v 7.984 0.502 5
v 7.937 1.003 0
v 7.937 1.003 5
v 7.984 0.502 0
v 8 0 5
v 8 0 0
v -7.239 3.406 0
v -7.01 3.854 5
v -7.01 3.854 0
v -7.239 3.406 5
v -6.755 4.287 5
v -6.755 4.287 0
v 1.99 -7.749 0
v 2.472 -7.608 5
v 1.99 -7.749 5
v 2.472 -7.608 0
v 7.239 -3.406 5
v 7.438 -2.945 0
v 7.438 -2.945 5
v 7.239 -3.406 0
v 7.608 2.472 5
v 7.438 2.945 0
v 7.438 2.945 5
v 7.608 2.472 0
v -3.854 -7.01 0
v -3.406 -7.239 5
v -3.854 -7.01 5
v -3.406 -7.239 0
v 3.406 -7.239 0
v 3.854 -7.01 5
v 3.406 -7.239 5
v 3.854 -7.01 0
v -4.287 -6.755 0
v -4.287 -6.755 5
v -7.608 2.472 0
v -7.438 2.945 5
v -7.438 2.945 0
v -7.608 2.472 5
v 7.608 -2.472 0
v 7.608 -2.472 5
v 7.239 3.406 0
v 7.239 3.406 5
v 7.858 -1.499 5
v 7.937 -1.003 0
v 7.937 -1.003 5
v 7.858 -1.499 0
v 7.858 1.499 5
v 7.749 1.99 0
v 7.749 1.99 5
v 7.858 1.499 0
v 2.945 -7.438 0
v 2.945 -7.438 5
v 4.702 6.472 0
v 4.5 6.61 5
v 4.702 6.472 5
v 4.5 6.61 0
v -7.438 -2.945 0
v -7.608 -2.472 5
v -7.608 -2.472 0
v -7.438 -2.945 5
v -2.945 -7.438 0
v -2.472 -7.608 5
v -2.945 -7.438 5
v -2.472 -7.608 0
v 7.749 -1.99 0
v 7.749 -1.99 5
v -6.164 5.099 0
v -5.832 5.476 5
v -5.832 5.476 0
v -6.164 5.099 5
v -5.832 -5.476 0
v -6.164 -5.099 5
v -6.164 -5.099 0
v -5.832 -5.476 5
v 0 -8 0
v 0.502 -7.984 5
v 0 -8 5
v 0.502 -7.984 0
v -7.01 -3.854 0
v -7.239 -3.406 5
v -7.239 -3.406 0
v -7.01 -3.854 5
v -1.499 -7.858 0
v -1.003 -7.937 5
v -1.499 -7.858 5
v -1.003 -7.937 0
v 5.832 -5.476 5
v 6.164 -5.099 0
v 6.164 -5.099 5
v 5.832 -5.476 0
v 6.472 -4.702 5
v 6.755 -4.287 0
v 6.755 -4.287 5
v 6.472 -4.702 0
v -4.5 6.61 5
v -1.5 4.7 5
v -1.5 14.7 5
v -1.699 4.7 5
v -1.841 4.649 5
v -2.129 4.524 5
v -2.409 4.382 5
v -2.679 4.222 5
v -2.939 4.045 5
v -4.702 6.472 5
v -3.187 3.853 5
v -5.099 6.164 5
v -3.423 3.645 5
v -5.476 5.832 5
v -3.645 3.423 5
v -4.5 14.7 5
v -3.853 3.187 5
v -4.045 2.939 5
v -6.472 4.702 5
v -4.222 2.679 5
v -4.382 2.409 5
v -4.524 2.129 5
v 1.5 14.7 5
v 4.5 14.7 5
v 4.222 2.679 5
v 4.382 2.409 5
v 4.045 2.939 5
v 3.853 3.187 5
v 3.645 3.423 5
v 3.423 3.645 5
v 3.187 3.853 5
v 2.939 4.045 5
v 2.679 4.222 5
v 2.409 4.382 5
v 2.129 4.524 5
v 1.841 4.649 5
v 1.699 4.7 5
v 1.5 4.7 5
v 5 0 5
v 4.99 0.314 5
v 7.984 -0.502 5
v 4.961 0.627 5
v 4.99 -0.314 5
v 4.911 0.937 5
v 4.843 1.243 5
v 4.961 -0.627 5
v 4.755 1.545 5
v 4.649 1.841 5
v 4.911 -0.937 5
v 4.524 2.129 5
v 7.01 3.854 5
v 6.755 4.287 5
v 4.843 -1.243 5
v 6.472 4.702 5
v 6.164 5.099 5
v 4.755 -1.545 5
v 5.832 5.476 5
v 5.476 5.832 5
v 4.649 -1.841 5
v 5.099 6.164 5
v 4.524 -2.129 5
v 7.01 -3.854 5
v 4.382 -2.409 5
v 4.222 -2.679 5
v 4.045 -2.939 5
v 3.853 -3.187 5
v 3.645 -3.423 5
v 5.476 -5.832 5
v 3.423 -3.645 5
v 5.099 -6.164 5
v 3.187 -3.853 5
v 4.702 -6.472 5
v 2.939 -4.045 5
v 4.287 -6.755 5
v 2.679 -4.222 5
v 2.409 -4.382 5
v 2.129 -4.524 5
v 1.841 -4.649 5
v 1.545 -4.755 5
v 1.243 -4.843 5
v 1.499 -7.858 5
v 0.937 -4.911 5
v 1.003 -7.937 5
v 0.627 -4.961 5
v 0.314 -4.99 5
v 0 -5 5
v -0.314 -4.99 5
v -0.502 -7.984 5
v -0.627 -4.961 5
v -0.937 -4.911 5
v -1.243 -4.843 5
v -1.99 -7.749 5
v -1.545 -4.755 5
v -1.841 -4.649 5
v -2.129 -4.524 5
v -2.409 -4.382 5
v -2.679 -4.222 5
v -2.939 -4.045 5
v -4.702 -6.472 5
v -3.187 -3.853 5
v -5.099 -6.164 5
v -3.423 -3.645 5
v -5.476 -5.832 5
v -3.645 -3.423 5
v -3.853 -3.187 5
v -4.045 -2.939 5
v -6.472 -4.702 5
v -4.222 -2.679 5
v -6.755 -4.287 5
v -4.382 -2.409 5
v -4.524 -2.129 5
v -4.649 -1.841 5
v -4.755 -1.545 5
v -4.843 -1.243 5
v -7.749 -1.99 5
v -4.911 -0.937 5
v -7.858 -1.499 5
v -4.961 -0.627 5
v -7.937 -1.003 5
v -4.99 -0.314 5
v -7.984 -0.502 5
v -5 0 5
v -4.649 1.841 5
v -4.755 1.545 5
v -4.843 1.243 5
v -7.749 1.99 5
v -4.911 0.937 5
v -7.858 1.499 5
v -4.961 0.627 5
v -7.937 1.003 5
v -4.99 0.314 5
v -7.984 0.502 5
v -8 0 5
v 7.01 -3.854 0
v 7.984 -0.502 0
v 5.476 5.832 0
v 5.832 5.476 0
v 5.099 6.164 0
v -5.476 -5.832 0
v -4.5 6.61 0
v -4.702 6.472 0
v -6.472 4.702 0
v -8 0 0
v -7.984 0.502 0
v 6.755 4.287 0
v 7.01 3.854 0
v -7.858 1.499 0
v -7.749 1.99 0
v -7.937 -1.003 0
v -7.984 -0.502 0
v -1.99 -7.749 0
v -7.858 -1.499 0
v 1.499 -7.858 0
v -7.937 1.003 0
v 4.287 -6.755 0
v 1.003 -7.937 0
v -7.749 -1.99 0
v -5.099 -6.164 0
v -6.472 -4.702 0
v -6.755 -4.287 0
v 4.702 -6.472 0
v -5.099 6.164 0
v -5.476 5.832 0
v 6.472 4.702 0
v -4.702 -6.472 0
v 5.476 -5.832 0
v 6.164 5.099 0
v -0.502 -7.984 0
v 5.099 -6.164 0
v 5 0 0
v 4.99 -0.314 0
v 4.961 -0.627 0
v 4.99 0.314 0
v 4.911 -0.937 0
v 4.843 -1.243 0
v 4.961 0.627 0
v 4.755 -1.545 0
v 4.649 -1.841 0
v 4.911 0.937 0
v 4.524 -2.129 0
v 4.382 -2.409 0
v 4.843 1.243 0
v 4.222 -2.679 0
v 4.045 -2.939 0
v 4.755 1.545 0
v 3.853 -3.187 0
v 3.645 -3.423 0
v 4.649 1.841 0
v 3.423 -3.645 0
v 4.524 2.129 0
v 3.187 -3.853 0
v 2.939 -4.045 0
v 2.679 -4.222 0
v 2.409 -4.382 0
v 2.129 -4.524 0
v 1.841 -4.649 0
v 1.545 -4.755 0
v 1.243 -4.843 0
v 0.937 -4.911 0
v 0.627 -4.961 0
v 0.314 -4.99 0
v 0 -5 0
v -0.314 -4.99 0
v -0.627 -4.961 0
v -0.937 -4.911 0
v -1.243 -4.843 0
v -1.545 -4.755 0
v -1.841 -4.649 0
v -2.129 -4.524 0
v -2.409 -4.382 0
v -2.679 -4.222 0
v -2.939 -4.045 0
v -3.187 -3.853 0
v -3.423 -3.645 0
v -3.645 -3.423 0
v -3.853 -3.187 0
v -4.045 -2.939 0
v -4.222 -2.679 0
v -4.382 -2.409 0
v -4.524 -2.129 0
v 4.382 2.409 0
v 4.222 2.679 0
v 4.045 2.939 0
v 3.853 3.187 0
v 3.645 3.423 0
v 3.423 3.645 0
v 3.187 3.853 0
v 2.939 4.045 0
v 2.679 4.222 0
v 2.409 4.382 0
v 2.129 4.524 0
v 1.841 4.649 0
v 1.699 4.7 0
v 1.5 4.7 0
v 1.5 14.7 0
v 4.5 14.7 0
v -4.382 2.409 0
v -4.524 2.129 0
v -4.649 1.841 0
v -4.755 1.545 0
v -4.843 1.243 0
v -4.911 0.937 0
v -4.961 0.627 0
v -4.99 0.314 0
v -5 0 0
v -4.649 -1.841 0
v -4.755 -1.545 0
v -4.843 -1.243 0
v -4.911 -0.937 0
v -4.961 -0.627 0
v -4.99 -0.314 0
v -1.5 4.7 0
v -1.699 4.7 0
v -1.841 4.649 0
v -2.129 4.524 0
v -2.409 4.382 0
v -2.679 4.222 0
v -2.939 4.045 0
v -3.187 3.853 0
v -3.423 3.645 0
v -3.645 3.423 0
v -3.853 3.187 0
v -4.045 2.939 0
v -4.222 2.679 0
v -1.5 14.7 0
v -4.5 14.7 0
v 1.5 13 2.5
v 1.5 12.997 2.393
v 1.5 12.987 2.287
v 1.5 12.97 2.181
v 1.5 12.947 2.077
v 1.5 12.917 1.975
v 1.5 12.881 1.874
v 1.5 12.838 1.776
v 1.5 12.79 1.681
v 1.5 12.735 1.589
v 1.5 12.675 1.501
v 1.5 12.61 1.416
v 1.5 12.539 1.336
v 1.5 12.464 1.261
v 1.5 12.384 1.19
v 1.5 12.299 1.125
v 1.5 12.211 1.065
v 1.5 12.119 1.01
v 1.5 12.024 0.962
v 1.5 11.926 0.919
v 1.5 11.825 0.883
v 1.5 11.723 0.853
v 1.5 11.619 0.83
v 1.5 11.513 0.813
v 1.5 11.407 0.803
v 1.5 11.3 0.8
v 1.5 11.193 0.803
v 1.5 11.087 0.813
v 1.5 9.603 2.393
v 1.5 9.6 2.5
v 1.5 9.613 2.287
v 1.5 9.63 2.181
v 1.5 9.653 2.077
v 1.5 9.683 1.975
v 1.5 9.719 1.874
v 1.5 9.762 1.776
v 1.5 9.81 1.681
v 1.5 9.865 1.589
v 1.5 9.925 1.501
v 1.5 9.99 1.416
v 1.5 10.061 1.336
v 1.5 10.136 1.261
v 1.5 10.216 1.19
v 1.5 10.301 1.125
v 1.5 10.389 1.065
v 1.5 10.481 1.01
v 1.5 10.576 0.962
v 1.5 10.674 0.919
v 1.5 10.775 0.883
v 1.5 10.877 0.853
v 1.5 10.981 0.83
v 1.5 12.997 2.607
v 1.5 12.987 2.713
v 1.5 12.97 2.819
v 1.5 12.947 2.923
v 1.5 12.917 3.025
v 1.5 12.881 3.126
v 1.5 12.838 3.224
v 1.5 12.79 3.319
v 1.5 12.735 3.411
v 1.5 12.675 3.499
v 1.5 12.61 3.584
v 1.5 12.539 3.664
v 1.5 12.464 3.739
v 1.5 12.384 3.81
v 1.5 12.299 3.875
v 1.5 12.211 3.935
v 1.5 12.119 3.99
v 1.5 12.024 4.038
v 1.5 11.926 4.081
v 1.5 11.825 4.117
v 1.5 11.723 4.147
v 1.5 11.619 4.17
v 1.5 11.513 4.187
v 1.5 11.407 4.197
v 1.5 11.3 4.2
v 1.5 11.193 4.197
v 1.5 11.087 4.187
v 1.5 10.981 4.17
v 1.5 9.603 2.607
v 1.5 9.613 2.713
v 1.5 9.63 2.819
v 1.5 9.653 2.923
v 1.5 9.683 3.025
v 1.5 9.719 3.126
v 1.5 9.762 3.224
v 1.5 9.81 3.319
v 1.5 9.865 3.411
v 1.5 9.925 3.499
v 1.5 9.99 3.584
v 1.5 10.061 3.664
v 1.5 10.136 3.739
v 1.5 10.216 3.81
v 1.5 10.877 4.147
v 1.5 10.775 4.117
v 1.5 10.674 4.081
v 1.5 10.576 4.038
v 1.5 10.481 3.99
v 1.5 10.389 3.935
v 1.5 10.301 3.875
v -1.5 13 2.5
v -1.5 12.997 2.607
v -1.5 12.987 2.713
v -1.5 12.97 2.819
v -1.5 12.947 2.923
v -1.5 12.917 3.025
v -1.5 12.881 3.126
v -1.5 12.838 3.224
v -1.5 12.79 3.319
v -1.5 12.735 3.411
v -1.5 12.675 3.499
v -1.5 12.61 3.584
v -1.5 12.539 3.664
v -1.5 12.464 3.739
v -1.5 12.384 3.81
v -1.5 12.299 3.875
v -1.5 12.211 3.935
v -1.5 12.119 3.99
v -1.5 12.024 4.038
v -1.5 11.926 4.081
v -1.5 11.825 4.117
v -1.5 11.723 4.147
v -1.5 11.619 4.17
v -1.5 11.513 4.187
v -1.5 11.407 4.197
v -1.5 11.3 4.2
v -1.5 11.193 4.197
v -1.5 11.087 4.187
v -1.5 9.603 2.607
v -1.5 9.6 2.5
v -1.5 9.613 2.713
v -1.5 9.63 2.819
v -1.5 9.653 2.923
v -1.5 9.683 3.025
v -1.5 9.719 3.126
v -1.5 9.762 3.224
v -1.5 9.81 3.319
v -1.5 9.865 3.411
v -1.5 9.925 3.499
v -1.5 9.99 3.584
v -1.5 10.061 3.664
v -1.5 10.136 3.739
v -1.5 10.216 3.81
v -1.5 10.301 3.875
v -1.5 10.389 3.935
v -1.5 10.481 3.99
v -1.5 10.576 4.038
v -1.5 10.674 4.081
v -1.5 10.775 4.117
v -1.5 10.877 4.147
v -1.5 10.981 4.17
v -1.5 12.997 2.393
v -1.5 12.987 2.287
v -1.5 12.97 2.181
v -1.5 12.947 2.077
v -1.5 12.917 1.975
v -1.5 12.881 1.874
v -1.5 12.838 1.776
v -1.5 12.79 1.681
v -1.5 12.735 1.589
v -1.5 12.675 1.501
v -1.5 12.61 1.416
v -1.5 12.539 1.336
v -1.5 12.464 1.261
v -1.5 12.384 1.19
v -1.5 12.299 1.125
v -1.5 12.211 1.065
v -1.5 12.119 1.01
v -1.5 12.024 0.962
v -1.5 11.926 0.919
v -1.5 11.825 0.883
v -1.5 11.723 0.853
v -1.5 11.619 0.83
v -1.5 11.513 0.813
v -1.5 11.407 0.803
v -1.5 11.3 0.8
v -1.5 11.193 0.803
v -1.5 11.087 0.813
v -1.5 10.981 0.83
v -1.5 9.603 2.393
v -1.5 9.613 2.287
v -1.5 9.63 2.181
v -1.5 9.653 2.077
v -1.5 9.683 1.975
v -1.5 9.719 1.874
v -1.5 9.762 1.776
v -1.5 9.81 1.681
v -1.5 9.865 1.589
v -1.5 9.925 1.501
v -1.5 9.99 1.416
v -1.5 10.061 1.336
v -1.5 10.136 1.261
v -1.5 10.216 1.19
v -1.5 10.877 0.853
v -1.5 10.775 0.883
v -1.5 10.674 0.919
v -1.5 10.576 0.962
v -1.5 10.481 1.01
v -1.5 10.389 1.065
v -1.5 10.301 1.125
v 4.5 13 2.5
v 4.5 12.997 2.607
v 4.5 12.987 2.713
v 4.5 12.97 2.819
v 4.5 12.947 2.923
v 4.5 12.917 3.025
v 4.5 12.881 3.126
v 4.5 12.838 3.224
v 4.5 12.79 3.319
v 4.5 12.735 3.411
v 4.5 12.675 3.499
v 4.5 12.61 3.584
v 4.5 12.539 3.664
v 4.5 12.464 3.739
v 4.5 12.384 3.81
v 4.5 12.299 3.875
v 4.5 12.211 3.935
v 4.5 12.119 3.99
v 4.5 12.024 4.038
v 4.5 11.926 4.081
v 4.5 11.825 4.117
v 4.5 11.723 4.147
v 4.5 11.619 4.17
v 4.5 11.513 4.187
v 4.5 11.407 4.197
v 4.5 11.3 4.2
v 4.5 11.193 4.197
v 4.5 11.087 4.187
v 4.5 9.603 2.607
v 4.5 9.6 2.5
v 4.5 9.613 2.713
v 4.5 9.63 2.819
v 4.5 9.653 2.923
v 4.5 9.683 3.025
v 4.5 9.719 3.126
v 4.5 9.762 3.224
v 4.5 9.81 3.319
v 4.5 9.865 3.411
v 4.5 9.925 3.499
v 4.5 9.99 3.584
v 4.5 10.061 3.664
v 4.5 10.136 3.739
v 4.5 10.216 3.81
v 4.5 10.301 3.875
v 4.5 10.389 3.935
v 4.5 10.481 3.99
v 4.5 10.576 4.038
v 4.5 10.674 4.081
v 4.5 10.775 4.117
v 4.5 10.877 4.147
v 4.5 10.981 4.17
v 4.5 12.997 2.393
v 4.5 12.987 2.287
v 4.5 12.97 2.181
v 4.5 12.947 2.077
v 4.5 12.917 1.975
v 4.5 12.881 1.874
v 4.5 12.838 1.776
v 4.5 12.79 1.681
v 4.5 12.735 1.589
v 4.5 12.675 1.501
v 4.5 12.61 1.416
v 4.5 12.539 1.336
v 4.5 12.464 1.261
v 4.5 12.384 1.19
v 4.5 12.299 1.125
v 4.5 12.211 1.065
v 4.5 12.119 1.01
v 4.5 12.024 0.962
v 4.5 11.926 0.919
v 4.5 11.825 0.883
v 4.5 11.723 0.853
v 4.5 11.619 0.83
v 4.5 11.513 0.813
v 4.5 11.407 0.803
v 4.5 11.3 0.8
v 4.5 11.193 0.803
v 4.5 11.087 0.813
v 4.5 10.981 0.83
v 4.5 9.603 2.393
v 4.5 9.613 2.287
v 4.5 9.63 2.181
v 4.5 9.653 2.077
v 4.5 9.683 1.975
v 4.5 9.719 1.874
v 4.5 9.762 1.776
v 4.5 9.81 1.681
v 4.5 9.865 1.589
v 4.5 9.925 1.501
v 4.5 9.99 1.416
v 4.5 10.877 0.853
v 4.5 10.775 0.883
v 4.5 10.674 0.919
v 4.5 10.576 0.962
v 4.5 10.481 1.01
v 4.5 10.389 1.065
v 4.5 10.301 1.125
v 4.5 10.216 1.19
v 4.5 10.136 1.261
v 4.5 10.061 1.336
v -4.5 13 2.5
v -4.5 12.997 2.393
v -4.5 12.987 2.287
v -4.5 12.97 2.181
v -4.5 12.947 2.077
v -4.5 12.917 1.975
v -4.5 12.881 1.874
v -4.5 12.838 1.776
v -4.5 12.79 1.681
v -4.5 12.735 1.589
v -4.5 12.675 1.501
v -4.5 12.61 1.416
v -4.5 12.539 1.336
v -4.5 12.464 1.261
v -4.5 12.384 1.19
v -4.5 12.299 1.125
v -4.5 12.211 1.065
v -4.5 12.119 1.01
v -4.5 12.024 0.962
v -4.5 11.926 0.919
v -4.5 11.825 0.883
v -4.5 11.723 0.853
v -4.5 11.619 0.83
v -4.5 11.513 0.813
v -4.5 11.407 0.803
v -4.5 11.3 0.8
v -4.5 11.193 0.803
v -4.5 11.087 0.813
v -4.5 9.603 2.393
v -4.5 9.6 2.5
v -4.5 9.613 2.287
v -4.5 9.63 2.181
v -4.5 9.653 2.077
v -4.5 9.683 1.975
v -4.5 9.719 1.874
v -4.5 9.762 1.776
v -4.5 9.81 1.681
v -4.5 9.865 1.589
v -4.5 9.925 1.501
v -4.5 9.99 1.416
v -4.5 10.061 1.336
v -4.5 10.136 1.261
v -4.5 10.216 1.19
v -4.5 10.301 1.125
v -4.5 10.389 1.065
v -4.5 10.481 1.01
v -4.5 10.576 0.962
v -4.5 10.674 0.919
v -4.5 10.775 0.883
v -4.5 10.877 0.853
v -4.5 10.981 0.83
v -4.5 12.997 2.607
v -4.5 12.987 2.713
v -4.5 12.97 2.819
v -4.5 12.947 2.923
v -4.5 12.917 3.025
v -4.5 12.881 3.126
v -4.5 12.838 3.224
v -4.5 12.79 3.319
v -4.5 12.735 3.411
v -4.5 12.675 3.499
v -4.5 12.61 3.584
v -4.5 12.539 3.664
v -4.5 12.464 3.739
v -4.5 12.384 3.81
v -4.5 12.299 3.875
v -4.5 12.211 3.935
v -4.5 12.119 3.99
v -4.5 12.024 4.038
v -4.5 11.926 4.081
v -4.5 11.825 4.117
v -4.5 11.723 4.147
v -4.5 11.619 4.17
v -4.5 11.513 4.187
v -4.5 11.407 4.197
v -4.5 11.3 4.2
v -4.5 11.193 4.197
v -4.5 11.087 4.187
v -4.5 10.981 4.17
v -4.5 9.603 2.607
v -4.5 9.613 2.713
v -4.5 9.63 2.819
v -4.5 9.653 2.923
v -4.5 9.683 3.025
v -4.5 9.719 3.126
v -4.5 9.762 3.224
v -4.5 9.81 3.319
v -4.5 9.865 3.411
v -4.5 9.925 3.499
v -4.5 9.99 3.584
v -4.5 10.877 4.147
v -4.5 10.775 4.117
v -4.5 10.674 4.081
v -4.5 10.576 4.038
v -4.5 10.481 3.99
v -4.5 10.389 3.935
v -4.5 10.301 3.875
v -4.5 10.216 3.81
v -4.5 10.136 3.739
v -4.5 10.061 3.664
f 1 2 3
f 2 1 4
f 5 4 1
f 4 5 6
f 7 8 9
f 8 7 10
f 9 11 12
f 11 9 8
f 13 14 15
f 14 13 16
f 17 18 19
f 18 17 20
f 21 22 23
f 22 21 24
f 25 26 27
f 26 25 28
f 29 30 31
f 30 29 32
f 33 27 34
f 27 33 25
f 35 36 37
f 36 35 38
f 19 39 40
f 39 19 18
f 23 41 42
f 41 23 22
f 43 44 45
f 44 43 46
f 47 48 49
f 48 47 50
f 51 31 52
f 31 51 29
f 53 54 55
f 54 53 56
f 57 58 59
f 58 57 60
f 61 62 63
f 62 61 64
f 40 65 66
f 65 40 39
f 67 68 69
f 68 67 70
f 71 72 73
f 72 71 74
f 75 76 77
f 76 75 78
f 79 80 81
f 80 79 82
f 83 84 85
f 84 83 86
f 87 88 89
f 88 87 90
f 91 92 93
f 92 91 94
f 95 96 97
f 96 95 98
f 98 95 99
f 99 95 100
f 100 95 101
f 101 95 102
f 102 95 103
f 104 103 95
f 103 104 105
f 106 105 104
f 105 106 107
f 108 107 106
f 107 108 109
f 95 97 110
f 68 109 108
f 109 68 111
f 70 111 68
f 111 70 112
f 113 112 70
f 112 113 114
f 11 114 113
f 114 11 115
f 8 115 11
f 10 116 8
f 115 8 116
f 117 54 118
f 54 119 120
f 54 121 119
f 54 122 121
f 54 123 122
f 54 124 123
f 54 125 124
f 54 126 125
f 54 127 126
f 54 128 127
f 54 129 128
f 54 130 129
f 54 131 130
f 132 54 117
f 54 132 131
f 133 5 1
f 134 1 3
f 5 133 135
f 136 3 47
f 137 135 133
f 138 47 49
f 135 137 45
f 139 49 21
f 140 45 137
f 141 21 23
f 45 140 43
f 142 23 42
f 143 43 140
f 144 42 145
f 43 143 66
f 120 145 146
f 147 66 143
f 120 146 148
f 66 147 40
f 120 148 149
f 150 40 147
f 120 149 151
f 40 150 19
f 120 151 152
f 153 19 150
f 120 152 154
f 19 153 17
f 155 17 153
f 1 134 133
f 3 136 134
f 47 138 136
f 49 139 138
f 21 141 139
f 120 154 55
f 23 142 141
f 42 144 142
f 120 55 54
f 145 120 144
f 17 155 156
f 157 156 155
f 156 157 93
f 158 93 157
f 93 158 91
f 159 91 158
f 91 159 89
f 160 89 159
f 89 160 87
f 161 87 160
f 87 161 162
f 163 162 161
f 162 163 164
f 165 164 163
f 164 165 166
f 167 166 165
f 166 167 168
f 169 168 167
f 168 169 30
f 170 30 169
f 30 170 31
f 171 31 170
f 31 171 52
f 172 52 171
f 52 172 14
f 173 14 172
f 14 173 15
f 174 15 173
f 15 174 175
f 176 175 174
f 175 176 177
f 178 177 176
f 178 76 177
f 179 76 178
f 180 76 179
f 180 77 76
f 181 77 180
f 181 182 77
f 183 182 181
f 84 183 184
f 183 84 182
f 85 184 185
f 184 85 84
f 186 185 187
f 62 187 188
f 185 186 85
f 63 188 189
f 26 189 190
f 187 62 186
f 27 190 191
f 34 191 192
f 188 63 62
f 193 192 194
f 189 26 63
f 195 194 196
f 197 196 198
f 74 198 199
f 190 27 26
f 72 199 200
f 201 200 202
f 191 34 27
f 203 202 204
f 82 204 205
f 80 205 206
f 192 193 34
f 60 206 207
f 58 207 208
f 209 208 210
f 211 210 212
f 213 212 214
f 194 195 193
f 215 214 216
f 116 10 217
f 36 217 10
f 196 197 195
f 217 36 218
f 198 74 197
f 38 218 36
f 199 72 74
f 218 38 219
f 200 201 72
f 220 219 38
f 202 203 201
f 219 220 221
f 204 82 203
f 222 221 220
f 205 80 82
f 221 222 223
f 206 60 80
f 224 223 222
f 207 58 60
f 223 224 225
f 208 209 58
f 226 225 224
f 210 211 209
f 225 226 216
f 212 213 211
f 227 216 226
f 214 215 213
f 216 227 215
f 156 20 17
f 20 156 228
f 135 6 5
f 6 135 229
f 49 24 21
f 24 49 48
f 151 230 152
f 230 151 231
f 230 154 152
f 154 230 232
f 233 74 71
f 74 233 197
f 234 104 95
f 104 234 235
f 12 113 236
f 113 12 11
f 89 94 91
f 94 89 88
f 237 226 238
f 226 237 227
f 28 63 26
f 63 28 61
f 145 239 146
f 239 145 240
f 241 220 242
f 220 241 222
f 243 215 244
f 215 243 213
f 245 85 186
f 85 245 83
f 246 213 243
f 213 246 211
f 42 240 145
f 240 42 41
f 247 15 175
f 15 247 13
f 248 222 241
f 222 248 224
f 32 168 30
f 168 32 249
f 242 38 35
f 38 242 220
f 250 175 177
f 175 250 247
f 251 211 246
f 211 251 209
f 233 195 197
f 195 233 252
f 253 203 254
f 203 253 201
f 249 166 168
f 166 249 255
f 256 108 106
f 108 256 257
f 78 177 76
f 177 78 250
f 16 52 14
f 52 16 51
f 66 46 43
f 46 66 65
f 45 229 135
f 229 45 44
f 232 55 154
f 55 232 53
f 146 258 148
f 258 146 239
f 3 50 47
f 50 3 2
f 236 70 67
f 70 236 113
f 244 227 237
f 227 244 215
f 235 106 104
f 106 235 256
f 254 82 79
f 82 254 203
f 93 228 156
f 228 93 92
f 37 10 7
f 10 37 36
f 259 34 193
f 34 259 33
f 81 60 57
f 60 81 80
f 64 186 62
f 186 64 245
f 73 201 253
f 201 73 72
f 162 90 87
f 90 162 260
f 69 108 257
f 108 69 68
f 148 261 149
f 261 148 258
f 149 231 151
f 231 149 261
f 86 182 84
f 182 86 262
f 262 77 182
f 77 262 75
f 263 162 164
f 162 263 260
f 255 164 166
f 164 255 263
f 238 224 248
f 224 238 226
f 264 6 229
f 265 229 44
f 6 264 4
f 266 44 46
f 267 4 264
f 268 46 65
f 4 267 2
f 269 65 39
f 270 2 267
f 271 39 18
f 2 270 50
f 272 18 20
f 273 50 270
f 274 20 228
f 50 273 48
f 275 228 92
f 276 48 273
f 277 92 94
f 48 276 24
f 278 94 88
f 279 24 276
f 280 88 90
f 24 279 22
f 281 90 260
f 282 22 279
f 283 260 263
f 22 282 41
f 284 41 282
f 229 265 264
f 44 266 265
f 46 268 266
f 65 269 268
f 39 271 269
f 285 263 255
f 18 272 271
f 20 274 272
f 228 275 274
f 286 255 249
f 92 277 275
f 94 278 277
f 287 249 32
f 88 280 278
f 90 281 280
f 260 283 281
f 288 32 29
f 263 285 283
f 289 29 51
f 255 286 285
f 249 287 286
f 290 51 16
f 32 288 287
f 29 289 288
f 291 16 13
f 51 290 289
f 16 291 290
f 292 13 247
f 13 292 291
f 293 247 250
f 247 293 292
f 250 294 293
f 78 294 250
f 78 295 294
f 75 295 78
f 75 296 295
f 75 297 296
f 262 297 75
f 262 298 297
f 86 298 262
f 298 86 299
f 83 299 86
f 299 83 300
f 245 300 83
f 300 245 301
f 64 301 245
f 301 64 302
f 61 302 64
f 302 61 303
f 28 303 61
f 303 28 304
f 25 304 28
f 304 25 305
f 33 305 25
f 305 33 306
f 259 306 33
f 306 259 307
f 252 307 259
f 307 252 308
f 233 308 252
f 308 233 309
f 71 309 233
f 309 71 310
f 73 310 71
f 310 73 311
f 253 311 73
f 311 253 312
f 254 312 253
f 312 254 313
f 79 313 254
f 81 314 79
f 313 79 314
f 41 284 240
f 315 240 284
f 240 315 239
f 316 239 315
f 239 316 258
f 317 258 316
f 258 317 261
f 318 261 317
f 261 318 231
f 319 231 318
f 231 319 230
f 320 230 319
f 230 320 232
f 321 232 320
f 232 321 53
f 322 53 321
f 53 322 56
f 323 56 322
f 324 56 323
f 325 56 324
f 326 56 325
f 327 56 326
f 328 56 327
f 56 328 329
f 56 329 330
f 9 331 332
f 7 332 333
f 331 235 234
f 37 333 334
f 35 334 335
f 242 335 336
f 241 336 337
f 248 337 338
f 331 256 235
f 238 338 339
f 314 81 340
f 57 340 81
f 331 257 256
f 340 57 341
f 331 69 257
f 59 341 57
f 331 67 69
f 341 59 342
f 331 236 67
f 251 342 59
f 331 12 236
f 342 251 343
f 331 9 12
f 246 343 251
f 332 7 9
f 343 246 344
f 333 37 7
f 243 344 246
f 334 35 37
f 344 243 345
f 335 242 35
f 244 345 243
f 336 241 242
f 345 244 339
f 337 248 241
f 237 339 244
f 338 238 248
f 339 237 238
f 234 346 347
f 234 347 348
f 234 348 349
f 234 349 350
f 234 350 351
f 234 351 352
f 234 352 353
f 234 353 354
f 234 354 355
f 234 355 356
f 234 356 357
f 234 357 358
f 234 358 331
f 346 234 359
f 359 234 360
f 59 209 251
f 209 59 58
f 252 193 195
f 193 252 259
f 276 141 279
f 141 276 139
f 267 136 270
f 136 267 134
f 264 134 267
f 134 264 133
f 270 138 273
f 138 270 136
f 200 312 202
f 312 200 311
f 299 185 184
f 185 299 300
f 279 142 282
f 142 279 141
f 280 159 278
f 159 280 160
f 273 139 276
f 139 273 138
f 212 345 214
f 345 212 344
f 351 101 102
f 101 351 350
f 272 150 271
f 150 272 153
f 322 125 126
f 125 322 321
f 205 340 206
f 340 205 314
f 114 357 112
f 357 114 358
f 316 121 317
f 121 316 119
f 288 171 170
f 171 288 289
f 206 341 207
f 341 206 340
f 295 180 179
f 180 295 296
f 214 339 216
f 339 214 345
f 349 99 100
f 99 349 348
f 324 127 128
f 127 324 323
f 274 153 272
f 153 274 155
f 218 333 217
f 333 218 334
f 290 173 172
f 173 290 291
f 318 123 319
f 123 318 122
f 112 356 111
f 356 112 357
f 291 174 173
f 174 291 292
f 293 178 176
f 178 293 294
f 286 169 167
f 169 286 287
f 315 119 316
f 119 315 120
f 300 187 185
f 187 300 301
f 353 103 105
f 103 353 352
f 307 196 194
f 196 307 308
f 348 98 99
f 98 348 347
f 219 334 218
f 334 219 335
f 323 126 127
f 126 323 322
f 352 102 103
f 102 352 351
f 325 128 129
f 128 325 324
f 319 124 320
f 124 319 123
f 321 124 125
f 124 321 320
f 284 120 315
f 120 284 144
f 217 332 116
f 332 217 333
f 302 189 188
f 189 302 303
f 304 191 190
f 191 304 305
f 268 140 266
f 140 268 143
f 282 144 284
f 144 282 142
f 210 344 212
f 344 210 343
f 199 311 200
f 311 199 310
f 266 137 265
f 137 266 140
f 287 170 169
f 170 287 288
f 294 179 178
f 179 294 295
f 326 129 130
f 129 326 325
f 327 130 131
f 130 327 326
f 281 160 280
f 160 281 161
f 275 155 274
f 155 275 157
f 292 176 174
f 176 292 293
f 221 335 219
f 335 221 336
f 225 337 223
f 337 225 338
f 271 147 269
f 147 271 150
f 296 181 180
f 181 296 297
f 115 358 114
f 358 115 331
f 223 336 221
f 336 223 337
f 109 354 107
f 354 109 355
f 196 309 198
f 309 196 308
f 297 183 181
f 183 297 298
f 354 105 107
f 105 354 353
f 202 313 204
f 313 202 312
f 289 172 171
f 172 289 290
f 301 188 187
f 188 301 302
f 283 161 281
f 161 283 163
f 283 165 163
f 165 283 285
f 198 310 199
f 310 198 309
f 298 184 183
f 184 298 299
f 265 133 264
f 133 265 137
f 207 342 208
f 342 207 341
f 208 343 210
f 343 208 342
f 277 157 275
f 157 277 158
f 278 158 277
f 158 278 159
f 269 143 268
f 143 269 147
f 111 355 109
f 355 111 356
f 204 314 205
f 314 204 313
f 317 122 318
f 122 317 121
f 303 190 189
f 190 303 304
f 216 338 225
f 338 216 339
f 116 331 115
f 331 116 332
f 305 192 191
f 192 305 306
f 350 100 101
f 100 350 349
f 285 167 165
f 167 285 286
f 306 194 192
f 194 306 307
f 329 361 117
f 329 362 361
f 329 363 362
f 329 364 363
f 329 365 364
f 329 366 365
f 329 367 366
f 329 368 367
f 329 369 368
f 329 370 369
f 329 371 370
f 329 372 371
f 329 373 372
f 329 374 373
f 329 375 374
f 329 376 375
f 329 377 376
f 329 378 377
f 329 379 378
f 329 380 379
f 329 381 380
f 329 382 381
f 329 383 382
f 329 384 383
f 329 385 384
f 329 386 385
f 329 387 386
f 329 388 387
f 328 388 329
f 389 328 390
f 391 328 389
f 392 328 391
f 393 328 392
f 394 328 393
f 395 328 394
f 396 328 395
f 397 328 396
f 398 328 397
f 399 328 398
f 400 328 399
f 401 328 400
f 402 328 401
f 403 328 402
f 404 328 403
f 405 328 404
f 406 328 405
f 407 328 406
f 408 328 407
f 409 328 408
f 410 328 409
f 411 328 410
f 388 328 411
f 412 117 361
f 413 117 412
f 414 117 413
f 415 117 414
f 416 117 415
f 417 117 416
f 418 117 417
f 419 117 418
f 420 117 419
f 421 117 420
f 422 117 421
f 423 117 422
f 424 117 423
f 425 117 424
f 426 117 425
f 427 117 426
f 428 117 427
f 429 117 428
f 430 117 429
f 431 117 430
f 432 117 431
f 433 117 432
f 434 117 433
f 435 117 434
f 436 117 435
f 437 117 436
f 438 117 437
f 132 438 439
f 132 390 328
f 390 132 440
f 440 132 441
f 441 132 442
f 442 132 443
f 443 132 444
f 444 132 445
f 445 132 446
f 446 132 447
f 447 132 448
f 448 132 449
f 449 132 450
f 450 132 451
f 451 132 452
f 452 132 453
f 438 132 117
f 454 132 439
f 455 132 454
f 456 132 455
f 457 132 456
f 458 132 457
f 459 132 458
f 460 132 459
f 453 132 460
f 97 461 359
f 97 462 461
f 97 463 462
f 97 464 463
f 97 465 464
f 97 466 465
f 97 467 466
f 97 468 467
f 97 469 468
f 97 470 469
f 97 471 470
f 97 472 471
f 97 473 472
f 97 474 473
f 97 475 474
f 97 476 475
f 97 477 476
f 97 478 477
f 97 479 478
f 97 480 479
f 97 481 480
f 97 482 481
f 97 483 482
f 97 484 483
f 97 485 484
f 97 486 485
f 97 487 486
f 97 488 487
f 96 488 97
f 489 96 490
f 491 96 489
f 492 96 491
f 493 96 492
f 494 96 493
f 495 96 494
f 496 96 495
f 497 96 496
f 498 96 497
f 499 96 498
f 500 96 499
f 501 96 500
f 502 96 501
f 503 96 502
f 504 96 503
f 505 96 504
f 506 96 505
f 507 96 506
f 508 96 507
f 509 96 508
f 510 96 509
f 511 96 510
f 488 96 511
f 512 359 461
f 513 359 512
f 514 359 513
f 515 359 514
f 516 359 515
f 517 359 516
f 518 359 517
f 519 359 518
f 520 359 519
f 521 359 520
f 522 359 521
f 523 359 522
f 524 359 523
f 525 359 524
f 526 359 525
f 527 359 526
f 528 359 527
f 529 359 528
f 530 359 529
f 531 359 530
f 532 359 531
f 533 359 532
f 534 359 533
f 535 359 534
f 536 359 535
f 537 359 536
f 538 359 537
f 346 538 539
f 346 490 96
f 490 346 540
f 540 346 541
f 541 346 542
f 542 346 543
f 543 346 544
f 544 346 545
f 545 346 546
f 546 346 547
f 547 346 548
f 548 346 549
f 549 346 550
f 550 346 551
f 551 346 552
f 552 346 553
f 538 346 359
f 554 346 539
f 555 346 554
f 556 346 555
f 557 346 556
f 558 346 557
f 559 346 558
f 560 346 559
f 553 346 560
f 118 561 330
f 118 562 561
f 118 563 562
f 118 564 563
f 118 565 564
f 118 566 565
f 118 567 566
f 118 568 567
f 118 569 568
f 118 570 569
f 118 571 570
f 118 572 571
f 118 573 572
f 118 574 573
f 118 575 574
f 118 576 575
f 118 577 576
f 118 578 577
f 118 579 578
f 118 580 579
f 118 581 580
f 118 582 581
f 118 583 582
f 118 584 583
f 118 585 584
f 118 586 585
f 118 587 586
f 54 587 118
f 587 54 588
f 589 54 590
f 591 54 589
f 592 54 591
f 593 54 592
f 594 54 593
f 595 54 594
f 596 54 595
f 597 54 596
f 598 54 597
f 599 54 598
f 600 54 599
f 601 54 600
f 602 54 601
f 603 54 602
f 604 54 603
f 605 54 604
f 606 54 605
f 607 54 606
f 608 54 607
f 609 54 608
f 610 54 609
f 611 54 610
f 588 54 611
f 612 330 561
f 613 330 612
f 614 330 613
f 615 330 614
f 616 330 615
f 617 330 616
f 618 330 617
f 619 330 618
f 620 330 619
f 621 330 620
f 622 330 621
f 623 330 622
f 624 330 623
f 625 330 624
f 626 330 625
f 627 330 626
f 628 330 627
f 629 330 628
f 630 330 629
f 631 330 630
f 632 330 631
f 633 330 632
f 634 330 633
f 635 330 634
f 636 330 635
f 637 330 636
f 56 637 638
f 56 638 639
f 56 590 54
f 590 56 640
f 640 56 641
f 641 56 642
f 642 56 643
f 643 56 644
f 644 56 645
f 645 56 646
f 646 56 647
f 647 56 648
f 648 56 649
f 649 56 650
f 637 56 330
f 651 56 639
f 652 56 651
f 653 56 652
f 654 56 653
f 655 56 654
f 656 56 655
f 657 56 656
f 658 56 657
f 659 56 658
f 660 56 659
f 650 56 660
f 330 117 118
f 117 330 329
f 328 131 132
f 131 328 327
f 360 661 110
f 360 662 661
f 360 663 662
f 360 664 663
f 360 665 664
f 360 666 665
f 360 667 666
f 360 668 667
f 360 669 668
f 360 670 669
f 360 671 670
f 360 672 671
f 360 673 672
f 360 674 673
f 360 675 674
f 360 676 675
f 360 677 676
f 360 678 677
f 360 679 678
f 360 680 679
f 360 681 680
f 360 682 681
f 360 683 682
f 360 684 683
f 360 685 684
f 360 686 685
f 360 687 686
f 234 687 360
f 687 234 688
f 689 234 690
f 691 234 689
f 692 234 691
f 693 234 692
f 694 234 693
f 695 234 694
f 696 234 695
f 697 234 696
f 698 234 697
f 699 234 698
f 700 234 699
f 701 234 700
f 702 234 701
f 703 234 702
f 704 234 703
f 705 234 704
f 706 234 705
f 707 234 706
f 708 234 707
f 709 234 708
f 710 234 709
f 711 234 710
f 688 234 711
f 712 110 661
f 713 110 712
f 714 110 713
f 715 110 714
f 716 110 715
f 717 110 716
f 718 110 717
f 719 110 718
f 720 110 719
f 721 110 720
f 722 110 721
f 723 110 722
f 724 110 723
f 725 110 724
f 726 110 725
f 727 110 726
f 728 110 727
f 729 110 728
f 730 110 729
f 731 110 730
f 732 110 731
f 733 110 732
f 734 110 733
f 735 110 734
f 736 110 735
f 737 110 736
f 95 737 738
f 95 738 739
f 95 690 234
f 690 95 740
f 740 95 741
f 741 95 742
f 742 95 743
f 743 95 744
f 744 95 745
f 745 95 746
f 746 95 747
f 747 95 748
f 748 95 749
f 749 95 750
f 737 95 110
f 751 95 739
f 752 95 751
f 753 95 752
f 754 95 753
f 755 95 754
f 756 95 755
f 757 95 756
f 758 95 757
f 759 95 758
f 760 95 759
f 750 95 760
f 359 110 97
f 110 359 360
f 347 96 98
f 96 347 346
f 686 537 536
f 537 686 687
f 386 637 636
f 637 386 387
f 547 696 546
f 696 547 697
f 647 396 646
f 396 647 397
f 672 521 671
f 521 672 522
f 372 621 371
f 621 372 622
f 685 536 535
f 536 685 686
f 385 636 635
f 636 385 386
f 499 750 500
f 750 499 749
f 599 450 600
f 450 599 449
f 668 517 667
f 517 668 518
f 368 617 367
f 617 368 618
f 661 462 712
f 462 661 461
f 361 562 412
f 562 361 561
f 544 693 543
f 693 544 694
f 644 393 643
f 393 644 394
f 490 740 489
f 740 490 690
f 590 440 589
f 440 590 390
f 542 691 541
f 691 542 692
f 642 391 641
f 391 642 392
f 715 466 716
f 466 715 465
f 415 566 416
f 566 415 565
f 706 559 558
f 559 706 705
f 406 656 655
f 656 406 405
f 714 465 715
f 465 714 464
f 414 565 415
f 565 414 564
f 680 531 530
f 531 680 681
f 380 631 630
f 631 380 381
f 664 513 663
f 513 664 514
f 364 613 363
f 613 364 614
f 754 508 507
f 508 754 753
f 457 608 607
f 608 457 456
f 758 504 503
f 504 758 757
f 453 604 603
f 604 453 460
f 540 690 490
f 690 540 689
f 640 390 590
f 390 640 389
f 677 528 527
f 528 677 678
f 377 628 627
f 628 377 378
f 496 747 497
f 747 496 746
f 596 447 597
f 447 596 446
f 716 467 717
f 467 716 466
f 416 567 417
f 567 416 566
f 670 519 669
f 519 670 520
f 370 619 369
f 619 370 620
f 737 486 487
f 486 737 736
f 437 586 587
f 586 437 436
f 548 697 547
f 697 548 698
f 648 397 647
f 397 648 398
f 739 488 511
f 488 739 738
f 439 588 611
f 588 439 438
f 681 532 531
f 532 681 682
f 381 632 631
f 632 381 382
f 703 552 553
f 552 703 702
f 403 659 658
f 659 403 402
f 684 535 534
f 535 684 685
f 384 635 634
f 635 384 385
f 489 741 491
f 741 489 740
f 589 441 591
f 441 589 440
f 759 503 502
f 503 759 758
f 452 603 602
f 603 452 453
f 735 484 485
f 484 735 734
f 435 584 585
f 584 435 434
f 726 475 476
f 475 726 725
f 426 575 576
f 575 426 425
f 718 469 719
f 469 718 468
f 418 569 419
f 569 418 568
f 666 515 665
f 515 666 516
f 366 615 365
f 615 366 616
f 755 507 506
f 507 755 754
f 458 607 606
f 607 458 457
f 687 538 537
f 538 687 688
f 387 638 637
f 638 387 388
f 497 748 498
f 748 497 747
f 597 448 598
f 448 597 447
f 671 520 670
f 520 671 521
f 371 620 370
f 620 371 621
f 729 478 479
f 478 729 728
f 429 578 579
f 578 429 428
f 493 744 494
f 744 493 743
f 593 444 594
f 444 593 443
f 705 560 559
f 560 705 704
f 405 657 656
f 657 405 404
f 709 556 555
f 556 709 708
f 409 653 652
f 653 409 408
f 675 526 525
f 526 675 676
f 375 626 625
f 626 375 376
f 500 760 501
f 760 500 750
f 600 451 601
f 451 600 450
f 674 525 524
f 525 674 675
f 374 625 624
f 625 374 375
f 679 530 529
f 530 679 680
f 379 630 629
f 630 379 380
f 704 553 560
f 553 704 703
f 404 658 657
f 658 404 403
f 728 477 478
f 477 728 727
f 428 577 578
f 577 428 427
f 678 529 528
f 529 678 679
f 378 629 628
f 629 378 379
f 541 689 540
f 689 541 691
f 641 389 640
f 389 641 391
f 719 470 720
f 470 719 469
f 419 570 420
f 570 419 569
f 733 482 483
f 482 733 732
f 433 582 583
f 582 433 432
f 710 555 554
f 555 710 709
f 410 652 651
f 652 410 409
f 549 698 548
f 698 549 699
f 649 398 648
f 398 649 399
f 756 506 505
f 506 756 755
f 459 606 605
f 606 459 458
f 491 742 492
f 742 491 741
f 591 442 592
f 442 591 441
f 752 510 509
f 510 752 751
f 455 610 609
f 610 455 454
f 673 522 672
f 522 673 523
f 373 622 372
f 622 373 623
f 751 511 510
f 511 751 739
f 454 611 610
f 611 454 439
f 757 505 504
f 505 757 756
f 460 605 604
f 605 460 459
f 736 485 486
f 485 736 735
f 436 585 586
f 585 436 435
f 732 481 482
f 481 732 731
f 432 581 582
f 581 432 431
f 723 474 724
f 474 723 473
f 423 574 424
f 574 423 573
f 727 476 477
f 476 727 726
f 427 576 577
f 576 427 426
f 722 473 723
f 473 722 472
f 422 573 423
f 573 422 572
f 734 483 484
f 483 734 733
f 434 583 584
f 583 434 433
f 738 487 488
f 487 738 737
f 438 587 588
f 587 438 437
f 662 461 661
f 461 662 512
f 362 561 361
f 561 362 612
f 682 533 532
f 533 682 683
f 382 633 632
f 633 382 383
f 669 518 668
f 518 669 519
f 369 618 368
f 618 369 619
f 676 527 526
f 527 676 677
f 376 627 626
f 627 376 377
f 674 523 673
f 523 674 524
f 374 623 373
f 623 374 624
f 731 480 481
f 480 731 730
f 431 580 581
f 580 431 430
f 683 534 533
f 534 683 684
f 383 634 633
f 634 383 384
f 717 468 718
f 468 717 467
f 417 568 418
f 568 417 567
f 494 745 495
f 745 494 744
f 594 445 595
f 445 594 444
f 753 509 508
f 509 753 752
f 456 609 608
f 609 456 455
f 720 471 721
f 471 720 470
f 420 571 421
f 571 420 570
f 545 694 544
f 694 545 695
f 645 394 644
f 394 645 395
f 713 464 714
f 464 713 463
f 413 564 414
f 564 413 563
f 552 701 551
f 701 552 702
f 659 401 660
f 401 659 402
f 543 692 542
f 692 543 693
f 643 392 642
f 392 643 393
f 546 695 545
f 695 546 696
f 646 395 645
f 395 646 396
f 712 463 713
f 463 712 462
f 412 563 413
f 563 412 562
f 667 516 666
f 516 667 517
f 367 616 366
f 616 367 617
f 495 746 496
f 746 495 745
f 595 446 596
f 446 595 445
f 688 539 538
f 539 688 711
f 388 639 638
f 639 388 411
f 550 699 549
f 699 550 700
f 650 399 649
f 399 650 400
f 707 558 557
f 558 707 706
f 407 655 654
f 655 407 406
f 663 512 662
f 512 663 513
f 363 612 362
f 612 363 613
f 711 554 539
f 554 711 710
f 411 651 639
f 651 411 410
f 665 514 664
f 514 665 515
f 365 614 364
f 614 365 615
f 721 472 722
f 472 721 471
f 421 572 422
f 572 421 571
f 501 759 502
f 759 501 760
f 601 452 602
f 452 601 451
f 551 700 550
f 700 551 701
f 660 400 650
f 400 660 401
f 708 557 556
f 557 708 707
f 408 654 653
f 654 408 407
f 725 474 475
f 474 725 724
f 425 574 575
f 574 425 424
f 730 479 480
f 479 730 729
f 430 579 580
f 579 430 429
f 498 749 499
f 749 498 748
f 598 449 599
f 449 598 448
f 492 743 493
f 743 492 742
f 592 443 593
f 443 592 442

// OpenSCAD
// CSG.scad - Basic example of CSG usage
$fn=100; 
    wallThickness = 3;  //Thickness of walls
    halfWall = wallThickness / 2;
    depth = 20;         //depth of bracket


clamp(5,5,3,3,10,1.7);

//stand();
module stand(width=50,depth=20,height=20,wallThickness=3)
{
    halfWall = wallThickness / 2;
    
    cube([width,depth,wallThickness]);
    
    translate([width/2 - halfWall,0,0]){
        cube([wallThickness,depth,height]);
    }
    translate([width/2,depth,height + 5.3 + wallThickness -2])
    {
        rotate([90,0,0]){
            clamp(5.3);
        }
    }
}


module clamp(holeRadius, depth=20, gap=3, wallThickness = 3,tabSize=10,screwRadius=1.7)
{
    halfWall = wallThickness / 2;
    difference()
    {   
        cylinder(depth,holeRadius + wallThickness,holeRadius + wallThickness);
        cylinder(depth*2 + 5,holeRadius,holeRadius,center=true);
        translate([-gap/2, holeRadius - halfWall,-5]){
            cube([gap,wallThickness+2,depth + 20]);
        }
    }
    
    difference()
    {
        union()
        {
            translate([gap/2,holeRadius-0.3,0]){
                cube([wallThickness,tabSize,depth]);
            }
            
            translate([-gap/2 -wallThickness,holeRadius-0.3,0]){
                cube([wallThickness,tabSize,depth]);
            }
        }
        
        translate([0,holeRadius+wallThickness + tabSize/2 - screwRadius,depth/2])
            {
                rotate([0,90,0]){
                    cylinder(holeRadius*2,screwRadius,screwRadius, center=true);
                }
            }
    }
}


/*
translate([-24,0,0]) {
    union() {
        cube(15, center=true);
        sphere(10);
    }
}

intersection() {
    cube(15, center=true);
    sphere(10);
}

translate([24,0,0]) {
    difference() {
        cube(15, center=true);
        sphere(10);
    }
}
*/

echo(version=version());
// Written by Marius Kintel <marius@kintel.net>
//
// To the extent possible under law, the author(s) have dedicated all
// copyright and related and neighboring rights to this software to the
// public domain worldwide. This software is distributed without any
// warranty.
//
// You should have received a copy of the CC0 Public Domain
// Dedication along with this software.
// If not, see <http://creativecommons.org/publicdomain/zero/1.0/>.
